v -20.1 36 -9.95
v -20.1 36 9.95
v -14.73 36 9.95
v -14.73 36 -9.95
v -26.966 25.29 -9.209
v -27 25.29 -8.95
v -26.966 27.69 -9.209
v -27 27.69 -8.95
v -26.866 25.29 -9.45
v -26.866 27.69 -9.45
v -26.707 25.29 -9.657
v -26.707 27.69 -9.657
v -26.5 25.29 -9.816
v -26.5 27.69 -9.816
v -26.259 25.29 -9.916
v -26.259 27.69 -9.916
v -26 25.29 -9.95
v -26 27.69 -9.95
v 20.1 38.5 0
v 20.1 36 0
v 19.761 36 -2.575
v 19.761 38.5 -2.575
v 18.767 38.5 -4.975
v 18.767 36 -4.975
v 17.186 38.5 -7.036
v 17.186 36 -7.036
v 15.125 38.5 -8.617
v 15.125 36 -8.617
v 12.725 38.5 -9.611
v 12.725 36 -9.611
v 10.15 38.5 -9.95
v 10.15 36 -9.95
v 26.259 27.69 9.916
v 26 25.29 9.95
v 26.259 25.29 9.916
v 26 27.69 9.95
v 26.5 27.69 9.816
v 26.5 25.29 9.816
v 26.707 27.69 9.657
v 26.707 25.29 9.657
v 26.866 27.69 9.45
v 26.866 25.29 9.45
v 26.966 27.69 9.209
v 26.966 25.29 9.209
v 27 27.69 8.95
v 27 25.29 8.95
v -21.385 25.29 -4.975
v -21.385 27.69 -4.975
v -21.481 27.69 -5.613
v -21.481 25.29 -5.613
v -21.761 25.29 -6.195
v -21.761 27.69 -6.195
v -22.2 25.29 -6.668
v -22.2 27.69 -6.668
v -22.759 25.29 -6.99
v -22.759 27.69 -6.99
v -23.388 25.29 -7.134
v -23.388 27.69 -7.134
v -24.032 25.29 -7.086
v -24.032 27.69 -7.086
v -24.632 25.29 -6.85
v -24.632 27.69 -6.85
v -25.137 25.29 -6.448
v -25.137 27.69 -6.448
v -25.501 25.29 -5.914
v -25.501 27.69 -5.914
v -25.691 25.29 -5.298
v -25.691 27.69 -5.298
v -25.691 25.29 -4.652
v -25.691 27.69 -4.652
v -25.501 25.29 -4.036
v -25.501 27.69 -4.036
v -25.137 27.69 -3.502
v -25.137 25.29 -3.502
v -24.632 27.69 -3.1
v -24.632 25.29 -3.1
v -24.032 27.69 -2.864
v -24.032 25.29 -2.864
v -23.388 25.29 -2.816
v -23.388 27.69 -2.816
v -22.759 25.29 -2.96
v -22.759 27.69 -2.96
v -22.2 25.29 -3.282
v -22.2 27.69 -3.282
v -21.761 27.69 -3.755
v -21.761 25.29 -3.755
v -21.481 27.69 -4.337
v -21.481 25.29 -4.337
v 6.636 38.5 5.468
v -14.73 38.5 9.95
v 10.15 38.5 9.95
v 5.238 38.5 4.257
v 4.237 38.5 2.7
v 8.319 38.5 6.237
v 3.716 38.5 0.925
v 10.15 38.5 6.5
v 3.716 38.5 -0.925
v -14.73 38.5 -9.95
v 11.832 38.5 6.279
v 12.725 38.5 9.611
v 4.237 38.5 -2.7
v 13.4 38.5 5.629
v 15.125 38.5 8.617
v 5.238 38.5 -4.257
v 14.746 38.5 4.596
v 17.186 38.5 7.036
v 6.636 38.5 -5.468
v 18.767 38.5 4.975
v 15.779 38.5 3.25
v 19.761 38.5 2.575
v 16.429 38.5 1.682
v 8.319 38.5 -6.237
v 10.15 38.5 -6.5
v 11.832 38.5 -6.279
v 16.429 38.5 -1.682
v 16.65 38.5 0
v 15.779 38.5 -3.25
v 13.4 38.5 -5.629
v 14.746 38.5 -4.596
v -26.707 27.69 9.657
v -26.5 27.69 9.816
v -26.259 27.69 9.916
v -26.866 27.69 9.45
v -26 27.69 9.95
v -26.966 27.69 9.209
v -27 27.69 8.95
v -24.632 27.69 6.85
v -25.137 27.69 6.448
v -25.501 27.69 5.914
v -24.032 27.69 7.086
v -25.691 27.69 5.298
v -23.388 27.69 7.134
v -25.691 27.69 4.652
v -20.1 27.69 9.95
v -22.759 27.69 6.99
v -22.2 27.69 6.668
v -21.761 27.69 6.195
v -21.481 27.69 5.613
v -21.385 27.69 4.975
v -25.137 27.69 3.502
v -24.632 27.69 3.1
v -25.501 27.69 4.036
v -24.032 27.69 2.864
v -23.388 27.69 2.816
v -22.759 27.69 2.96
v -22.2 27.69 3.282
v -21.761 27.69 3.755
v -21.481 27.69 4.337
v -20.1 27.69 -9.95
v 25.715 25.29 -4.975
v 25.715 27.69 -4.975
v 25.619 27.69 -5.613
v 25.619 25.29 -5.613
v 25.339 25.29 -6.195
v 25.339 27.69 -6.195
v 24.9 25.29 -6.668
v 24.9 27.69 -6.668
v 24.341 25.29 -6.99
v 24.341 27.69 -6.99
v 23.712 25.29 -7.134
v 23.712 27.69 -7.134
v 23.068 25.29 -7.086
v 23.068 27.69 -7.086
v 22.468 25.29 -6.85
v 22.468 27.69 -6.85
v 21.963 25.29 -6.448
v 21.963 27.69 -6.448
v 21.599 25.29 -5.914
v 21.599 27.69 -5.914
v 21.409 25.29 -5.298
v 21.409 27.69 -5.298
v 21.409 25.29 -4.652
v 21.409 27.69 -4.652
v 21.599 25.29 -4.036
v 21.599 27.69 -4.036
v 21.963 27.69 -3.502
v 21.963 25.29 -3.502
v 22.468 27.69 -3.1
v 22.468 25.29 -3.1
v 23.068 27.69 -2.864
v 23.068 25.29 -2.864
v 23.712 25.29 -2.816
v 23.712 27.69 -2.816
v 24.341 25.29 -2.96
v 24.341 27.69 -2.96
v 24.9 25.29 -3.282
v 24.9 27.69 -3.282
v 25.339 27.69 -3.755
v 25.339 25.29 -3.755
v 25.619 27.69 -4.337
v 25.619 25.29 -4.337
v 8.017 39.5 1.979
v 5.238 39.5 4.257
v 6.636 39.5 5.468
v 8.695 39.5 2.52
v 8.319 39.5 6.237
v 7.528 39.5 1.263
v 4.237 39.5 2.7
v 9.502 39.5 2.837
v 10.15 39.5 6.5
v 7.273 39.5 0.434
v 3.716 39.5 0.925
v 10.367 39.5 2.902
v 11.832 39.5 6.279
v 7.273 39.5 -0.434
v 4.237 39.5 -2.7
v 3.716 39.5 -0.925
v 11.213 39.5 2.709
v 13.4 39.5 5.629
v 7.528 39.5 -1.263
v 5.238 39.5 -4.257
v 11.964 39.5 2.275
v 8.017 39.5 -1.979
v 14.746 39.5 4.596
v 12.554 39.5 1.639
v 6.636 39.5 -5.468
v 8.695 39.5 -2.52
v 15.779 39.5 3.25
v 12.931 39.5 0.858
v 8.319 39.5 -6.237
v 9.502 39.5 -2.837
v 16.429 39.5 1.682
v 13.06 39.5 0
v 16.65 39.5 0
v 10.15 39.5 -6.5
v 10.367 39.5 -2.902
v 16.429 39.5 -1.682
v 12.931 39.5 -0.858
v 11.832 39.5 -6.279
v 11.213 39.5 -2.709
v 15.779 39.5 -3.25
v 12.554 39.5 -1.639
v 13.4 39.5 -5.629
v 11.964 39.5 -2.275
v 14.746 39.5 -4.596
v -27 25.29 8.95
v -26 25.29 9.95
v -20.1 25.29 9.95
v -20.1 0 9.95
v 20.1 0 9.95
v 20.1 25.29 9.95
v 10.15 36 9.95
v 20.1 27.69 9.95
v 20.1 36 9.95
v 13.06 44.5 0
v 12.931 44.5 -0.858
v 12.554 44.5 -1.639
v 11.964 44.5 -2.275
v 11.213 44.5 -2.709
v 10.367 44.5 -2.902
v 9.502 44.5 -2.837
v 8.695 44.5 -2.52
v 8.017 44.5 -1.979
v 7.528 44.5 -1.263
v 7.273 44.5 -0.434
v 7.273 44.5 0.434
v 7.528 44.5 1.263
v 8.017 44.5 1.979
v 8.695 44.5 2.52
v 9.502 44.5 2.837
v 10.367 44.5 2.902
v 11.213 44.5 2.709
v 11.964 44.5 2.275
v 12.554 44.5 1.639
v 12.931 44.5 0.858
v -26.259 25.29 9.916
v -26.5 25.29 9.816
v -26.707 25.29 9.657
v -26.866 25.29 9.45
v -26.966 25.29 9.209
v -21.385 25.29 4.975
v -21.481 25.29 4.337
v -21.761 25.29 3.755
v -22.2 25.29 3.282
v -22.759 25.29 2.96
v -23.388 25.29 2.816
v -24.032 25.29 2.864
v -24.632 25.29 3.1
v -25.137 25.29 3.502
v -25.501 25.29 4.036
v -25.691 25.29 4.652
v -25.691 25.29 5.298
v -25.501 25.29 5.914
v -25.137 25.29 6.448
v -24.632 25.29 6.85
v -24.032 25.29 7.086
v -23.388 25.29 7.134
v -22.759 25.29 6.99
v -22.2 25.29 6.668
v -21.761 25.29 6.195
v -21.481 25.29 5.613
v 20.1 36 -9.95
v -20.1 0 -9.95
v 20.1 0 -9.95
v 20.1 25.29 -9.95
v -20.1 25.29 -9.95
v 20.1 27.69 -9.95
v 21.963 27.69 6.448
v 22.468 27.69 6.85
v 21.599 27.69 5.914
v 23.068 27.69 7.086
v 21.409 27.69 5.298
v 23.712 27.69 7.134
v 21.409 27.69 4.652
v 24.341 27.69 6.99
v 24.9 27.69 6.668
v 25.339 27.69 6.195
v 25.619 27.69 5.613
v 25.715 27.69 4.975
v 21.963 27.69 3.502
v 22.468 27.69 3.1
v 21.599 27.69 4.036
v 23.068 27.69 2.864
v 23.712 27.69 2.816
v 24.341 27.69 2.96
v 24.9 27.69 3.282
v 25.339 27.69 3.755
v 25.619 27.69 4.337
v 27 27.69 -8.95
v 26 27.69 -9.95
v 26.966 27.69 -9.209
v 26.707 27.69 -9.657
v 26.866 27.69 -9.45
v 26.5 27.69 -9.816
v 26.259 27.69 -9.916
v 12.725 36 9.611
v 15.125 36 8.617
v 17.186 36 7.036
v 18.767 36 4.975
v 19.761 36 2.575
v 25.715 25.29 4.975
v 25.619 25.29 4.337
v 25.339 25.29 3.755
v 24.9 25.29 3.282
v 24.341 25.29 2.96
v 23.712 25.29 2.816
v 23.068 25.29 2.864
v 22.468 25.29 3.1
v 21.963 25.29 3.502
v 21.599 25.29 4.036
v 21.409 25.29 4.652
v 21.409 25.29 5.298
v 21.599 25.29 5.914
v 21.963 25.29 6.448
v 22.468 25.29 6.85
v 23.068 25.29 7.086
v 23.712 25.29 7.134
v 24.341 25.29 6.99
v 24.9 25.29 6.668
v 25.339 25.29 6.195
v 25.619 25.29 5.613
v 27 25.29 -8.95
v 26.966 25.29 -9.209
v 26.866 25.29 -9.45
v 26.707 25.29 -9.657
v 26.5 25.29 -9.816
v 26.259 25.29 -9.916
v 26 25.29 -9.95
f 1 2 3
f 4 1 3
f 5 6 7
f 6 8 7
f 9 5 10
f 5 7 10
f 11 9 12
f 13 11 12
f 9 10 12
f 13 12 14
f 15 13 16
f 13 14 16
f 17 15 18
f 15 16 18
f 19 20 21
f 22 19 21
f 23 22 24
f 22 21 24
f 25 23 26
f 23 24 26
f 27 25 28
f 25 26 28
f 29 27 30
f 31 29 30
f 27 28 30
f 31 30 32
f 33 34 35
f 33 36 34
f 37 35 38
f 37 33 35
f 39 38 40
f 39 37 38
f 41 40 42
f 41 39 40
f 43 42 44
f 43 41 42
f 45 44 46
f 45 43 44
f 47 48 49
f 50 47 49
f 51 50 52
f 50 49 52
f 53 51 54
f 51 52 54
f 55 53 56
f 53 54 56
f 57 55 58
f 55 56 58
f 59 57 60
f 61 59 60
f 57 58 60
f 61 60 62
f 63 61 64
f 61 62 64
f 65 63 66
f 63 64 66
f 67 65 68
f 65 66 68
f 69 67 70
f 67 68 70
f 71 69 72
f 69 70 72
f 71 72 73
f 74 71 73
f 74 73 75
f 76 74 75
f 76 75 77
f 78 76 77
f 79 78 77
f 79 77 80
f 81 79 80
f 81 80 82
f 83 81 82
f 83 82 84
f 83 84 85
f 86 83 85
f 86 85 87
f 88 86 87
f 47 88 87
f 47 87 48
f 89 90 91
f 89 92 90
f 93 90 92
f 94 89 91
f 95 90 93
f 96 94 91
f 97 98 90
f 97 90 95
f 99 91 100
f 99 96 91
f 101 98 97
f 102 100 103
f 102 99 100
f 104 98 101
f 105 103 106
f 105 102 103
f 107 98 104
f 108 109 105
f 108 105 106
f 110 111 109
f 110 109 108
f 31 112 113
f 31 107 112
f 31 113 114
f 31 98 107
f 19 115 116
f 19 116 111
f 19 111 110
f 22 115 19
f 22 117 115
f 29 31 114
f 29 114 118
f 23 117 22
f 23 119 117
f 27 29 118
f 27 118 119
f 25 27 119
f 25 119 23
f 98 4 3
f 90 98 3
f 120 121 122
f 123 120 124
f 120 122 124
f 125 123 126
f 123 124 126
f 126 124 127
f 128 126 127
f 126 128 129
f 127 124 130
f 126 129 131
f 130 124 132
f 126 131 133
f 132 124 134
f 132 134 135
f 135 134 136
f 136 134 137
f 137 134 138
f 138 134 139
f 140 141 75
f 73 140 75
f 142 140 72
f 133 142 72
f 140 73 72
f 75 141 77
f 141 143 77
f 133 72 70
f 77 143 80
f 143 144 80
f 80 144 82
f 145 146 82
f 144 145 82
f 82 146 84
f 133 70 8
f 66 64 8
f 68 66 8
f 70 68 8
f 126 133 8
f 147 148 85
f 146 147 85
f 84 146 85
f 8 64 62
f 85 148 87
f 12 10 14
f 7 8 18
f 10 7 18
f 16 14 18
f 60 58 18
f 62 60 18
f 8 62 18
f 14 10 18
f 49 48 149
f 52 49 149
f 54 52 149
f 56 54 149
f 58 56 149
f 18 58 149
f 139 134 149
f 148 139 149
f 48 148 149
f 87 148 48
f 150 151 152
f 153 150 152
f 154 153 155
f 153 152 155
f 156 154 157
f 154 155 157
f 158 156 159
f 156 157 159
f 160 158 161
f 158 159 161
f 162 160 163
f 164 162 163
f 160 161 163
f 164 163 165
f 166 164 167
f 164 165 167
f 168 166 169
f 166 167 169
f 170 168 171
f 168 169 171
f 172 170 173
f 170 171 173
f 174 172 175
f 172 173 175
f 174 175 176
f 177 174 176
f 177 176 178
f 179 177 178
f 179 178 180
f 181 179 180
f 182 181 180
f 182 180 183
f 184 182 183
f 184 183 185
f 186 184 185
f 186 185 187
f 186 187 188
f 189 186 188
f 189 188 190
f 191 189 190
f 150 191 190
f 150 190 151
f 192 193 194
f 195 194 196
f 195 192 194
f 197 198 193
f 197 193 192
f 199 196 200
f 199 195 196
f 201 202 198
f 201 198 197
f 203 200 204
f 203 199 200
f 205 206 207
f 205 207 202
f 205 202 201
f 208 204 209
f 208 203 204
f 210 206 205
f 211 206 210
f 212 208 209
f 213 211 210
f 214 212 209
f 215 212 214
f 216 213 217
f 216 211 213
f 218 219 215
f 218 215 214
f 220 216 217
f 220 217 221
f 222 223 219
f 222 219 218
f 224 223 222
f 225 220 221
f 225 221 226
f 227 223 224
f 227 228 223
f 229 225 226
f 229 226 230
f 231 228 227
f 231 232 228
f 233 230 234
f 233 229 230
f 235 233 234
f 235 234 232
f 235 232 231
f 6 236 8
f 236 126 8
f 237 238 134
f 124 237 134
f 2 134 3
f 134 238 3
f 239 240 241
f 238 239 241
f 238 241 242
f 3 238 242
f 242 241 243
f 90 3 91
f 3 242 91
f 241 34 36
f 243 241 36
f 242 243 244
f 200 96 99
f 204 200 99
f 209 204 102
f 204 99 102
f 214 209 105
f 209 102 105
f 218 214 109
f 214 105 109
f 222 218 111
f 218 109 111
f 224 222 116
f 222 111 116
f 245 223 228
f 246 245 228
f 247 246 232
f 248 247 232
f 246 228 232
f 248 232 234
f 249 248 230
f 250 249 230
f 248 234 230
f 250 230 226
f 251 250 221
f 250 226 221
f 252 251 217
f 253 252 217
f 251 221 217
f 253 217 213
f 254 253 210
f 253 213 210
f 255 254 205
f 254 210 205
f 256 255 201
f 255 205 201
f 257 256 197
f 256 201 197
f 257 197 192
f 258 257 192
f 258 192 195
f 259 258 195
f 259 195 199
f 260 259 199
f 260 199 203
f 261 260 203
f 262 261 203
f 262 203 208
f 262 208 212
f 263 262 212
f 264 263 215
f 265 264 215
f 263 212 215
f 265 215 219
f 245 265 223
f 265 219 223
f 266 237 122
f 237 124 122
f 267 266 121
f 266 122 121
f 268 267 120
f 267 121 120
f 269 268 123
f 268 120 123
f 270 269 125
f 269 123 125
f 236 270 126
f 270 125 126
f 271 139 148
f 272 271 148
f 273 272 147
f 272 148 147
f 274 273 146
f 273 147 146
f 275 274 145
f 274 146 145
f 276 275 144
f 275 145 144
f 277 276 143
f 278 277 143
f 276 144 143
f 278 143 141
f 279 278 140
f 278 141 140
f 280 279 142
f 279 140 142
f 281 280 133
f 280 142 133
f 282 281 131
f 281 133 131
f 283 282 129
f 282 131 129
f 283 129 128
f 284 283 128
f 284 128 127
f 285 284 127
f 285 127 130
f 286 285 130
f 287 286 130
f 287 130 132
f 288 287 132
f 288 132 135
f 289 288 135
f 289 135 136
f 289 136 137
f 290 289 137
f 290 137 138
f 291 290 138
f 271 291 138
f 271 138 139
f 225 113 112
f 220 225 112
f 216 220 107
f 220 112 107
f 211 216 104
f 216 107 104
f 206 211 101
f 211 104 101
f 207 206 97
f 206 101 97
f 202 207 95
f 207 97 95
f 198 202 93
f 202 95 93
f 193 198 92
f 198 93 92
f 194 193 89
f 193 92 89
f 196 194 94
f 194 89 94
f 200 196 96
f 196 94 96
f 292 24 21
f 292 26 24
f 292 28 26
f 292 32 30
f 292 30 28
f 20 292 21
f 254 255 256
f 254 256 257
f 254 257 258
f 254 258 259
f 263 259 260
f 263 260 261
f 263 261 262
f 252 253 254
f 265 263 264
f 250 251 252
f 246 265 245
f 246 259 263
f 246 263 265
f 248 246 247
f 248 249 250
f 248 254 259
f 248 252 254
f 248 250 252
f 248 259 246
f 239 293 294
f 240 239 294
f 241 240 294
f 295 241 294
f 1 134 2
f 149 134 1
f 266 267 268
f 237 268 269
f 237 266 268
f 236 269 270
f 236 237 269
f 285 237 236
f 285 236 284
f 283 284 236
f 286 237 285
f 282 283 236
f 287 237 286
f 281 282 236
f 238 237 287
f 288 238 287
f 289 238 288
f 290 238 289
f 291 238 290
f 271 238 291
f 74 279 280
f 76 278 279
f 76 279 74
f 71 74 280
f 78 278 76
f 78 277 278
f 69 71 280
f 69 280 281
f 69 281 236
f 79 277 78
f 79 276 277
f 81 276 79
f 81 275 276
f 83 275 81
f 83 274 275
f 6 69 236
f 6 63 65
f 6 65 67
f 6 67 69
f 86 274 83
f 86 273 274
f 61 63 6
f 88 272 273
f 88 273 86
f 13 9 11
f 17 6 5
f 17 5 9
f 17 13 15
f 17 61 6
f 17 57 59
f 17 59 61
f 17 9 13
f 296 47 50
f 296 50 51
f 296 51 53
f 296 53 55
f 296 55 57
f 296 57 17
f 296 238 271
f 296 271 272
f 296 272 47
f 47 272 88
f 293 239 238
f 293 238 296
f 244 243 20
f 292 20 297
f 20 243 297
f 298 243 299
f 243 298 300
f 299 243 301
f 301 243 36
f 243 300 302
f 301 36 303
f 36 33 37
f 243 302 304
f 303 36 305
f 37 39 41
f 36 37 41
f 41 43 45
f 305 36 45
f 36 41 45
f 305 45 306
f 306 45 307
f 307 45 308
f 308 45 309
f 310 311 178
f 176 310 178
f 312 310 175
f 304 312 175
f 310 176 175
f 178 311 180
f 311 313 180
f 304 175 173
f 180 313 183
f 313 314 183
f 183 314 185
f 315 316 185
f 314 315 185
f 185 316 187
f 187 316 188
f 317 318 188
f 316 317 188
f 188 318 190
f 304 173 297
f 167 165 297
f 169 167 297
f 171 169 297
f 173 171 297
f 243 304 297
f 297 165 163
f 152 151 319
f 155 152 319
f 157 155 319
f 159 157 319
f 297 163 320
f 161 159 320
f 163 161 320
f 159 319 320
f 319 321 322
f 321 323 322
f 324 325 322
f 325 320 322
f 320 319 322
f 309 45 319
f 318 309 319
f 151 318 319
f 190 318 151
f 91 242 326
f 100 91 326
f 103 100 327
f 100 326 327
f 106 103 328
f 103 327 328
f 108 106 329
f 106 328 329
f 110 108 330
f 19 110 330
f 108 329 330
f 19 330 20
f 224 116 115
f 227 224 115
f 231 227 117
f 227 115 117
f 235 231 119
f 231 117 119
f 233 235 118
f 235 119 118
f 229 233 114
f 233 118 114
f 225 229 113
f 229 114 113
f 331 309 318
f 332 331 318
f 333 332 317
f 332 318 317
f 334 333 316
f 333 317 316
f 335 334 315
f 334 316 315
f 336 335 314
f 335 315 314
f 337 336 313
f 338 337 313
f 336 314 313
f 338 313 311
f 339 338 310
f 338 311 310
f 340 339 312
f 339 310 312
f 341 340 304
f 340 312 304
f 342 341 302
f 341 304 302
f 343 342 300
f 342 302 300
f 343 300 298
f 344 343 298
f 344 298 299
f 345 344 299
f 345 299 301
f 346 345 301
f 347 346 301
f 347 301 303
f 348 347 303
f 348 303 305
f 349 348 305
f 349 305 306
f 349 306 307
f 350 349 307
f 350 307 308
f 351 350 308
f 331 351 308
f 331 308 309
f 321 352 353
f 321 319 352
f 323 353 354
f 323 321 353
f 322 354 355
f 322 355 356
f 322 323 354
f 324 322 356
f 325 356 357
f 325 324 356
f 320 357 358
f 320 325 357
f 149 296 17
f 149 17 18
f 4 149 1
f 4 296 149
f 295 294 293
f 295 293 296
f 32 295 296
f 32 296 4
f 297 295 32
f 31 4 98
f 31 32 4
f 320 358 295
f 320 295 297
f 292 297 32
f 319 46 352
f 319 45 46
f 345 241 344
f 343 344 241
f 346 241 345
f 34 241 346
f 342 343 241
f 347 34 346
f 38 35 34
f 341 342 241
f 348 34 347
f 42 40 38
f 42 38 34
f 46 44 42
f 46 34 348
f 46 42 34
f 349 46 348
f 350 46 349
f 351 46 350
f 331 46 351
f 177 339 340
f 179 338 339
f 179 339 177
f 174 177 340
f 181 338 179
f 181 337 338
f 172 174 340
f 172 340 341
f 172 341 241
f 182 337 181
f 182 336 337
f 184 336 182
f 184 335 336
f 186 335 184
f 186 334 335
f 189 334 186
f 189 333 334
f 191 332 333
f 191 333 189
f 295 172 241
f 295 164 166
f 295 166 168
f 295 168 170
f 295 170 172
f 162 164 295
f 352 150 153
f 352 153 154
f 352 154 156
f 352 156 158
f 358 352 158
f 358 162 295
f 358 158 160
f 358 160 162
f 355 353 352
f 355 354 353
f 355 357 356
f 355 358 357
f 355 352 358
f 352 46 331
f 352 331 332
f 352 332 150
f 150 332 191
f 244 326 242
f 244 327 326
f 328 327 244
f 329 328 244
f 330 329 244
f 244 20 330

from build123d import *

# Parameters (mm, degrees)
CROQUIS1_W              = 40.2
CROQUIS1_H              = 19.9
SALIENTE_EXTRUIR1_DEPTH = 36
CROQUIS4_W              = 19.9
CROQUIS4_H              = 2.4
SALIENTE_EXTRUIR3_DEPTH = 27
CROQUIS5_R              = 2.165
CORTAR_EXTRUIR2_DEPTH   = 57.31
SALIENTE_EXTRUIR5_DEPTH = 2.5
SALIENTE_EXTRUIR6_DEPTH = 1
CROQUIS8_R              = 2.91
SALIENTE_EXTRUIR7_DEPTH = 5
REDONDEO1_R             = 1


with BuildPart() as part:
    # Croquis1 → Saliente-Extruir1 (new body)
    with BuildSketch(Plane(origin=(0, 0, 0), x_dir=(1, 0, 0), z_dir=(0, 1, 0))):
        Rectangle(CROQUIS1_W, CROQUIS1_H)
    extrude(amount=SALIENTE_EXTRUIR1_DEPTH)

    # Croquis4 → Saliente-Extruir3 (add, symmetric)
    with BuildSketch(Plane(origin=(0, 0, 0), x_dir=(0, 0, -1), z_dir=(1, 0, 0))):
        with Locations((0, 26.49)):
            Rectangle(CROQUIS4_W, CROQUIS4_H)
    extrude(amount=SALIENTE_EXTRUIR3_DEPTH, both=True)

    # Croquis5 → Cortar-Extruir2 (cut)
    with BuildSketch(Plane(origin=(0, 27.69, 0), x_dir=(1, 0, 0), z_dir=(0, 1, 0))):
        with Locations((-23.55, 4.975)):
            Circle(CROQUIS5_R)
        with Locations((-23.55, -4.975)):
            Circle(CROQUIS5_R)
        with Locations((23.55, 4.975)):
            Circle(CROQUIS5_R)
        with Locations((23.55, -4.975)):
            Circle(CROQUIS5_R)
    extrude(amount=-CORTAR_EXTRUIR2_DEPTH, mode=Mode.SUBTRACT)

    # Croquis6 → Saliente-Extruir5 (add)
    with BuildSketch(Plane(origin=(0, 36, 0), x_dir=(1, 0, 0), z_dir=(0, 1, 0))):
        with BuildLine():
            ThreePointArc((10.15, -9.95), (0.2, 0), (10.15, 9.95))
            Line((10.15, 9.95), (-14.73, 9.95))
            Line((-14.73, 9.95), (-14.73, -9.95))
            Line((-14.73, -9.95), (10.15, -9.95))
        make_face()
        with BuildLine():
            ThreePointArc((20.1, 0), (17.185712473, 7.035712473), (10.15, 9.95))
            Line((10.15, 9.95), (10.15, -9.95))
            ThreePointArc((10.15, -9.95), (17.185712473, -7.035712473), (20.1, 0))
        make_face()
        with BuildLine():
            Line((10.15, -9.95), (10.15, 9.95))
            ThreePointArc((10.15, 9.95), (0.2, 0), (10.15, -9.95))
        make_face()
    extrude(amount=SALIENTE_EXTRUIR5_DEPTH)

    # Croquis7 → Saliente-Extruir6 (add)
    with BuildSketch(Plane(origin=(0, 38.5, 0), x_dir=(1, 0, 0), z_dir=(0, 1, 0))):
        with BuildLine():
            ThreePointArc((10.15, 6.5), (3.65, 0), (10.15, -6.5))
            Line((10.15, -6.5), (10.15, 6.5))
        make_face()
        with BuildLine():
            Line((10.15, 6.5), (10.15, -6.5))
            ThreePointArc((10.15, -6.5), (14.746194078, -4.596194078), (16.65, 0))
            ThreePointArc((16.65, 0), (14.746194078, 4.596194078), (10.15, 6.5))
        make_face()
    extrude(amount=SALIENTE_EXTRUIR6_DEPTH)

    # Croquis8 → Saliente-Extruir7 (add)
    with BuildSketch(Plane(origin=(0, 39.5, 0), x_dir=(1, 0, 0), z_dir=(0, 1, 0))):
        with Locations((10.15, 0)):
            Circle(CROQUIS8_R)
    extrude(amount=SALIENTE_EXTRUIR7_DEPTH)

    # Redondeo1
    redondeo1_edges = [part.edges().sort_by_distance(p)[0] for p in [
        (-27, 26.49, -9.95),
        (-27, 26.49, 9.95),
        (27, 26.49, -9.95),
        (27, 26.49, 9.95),
    ]]
    fillet(redondeo1_edges, radius=REDONDEO1_R)


solid = part.part
